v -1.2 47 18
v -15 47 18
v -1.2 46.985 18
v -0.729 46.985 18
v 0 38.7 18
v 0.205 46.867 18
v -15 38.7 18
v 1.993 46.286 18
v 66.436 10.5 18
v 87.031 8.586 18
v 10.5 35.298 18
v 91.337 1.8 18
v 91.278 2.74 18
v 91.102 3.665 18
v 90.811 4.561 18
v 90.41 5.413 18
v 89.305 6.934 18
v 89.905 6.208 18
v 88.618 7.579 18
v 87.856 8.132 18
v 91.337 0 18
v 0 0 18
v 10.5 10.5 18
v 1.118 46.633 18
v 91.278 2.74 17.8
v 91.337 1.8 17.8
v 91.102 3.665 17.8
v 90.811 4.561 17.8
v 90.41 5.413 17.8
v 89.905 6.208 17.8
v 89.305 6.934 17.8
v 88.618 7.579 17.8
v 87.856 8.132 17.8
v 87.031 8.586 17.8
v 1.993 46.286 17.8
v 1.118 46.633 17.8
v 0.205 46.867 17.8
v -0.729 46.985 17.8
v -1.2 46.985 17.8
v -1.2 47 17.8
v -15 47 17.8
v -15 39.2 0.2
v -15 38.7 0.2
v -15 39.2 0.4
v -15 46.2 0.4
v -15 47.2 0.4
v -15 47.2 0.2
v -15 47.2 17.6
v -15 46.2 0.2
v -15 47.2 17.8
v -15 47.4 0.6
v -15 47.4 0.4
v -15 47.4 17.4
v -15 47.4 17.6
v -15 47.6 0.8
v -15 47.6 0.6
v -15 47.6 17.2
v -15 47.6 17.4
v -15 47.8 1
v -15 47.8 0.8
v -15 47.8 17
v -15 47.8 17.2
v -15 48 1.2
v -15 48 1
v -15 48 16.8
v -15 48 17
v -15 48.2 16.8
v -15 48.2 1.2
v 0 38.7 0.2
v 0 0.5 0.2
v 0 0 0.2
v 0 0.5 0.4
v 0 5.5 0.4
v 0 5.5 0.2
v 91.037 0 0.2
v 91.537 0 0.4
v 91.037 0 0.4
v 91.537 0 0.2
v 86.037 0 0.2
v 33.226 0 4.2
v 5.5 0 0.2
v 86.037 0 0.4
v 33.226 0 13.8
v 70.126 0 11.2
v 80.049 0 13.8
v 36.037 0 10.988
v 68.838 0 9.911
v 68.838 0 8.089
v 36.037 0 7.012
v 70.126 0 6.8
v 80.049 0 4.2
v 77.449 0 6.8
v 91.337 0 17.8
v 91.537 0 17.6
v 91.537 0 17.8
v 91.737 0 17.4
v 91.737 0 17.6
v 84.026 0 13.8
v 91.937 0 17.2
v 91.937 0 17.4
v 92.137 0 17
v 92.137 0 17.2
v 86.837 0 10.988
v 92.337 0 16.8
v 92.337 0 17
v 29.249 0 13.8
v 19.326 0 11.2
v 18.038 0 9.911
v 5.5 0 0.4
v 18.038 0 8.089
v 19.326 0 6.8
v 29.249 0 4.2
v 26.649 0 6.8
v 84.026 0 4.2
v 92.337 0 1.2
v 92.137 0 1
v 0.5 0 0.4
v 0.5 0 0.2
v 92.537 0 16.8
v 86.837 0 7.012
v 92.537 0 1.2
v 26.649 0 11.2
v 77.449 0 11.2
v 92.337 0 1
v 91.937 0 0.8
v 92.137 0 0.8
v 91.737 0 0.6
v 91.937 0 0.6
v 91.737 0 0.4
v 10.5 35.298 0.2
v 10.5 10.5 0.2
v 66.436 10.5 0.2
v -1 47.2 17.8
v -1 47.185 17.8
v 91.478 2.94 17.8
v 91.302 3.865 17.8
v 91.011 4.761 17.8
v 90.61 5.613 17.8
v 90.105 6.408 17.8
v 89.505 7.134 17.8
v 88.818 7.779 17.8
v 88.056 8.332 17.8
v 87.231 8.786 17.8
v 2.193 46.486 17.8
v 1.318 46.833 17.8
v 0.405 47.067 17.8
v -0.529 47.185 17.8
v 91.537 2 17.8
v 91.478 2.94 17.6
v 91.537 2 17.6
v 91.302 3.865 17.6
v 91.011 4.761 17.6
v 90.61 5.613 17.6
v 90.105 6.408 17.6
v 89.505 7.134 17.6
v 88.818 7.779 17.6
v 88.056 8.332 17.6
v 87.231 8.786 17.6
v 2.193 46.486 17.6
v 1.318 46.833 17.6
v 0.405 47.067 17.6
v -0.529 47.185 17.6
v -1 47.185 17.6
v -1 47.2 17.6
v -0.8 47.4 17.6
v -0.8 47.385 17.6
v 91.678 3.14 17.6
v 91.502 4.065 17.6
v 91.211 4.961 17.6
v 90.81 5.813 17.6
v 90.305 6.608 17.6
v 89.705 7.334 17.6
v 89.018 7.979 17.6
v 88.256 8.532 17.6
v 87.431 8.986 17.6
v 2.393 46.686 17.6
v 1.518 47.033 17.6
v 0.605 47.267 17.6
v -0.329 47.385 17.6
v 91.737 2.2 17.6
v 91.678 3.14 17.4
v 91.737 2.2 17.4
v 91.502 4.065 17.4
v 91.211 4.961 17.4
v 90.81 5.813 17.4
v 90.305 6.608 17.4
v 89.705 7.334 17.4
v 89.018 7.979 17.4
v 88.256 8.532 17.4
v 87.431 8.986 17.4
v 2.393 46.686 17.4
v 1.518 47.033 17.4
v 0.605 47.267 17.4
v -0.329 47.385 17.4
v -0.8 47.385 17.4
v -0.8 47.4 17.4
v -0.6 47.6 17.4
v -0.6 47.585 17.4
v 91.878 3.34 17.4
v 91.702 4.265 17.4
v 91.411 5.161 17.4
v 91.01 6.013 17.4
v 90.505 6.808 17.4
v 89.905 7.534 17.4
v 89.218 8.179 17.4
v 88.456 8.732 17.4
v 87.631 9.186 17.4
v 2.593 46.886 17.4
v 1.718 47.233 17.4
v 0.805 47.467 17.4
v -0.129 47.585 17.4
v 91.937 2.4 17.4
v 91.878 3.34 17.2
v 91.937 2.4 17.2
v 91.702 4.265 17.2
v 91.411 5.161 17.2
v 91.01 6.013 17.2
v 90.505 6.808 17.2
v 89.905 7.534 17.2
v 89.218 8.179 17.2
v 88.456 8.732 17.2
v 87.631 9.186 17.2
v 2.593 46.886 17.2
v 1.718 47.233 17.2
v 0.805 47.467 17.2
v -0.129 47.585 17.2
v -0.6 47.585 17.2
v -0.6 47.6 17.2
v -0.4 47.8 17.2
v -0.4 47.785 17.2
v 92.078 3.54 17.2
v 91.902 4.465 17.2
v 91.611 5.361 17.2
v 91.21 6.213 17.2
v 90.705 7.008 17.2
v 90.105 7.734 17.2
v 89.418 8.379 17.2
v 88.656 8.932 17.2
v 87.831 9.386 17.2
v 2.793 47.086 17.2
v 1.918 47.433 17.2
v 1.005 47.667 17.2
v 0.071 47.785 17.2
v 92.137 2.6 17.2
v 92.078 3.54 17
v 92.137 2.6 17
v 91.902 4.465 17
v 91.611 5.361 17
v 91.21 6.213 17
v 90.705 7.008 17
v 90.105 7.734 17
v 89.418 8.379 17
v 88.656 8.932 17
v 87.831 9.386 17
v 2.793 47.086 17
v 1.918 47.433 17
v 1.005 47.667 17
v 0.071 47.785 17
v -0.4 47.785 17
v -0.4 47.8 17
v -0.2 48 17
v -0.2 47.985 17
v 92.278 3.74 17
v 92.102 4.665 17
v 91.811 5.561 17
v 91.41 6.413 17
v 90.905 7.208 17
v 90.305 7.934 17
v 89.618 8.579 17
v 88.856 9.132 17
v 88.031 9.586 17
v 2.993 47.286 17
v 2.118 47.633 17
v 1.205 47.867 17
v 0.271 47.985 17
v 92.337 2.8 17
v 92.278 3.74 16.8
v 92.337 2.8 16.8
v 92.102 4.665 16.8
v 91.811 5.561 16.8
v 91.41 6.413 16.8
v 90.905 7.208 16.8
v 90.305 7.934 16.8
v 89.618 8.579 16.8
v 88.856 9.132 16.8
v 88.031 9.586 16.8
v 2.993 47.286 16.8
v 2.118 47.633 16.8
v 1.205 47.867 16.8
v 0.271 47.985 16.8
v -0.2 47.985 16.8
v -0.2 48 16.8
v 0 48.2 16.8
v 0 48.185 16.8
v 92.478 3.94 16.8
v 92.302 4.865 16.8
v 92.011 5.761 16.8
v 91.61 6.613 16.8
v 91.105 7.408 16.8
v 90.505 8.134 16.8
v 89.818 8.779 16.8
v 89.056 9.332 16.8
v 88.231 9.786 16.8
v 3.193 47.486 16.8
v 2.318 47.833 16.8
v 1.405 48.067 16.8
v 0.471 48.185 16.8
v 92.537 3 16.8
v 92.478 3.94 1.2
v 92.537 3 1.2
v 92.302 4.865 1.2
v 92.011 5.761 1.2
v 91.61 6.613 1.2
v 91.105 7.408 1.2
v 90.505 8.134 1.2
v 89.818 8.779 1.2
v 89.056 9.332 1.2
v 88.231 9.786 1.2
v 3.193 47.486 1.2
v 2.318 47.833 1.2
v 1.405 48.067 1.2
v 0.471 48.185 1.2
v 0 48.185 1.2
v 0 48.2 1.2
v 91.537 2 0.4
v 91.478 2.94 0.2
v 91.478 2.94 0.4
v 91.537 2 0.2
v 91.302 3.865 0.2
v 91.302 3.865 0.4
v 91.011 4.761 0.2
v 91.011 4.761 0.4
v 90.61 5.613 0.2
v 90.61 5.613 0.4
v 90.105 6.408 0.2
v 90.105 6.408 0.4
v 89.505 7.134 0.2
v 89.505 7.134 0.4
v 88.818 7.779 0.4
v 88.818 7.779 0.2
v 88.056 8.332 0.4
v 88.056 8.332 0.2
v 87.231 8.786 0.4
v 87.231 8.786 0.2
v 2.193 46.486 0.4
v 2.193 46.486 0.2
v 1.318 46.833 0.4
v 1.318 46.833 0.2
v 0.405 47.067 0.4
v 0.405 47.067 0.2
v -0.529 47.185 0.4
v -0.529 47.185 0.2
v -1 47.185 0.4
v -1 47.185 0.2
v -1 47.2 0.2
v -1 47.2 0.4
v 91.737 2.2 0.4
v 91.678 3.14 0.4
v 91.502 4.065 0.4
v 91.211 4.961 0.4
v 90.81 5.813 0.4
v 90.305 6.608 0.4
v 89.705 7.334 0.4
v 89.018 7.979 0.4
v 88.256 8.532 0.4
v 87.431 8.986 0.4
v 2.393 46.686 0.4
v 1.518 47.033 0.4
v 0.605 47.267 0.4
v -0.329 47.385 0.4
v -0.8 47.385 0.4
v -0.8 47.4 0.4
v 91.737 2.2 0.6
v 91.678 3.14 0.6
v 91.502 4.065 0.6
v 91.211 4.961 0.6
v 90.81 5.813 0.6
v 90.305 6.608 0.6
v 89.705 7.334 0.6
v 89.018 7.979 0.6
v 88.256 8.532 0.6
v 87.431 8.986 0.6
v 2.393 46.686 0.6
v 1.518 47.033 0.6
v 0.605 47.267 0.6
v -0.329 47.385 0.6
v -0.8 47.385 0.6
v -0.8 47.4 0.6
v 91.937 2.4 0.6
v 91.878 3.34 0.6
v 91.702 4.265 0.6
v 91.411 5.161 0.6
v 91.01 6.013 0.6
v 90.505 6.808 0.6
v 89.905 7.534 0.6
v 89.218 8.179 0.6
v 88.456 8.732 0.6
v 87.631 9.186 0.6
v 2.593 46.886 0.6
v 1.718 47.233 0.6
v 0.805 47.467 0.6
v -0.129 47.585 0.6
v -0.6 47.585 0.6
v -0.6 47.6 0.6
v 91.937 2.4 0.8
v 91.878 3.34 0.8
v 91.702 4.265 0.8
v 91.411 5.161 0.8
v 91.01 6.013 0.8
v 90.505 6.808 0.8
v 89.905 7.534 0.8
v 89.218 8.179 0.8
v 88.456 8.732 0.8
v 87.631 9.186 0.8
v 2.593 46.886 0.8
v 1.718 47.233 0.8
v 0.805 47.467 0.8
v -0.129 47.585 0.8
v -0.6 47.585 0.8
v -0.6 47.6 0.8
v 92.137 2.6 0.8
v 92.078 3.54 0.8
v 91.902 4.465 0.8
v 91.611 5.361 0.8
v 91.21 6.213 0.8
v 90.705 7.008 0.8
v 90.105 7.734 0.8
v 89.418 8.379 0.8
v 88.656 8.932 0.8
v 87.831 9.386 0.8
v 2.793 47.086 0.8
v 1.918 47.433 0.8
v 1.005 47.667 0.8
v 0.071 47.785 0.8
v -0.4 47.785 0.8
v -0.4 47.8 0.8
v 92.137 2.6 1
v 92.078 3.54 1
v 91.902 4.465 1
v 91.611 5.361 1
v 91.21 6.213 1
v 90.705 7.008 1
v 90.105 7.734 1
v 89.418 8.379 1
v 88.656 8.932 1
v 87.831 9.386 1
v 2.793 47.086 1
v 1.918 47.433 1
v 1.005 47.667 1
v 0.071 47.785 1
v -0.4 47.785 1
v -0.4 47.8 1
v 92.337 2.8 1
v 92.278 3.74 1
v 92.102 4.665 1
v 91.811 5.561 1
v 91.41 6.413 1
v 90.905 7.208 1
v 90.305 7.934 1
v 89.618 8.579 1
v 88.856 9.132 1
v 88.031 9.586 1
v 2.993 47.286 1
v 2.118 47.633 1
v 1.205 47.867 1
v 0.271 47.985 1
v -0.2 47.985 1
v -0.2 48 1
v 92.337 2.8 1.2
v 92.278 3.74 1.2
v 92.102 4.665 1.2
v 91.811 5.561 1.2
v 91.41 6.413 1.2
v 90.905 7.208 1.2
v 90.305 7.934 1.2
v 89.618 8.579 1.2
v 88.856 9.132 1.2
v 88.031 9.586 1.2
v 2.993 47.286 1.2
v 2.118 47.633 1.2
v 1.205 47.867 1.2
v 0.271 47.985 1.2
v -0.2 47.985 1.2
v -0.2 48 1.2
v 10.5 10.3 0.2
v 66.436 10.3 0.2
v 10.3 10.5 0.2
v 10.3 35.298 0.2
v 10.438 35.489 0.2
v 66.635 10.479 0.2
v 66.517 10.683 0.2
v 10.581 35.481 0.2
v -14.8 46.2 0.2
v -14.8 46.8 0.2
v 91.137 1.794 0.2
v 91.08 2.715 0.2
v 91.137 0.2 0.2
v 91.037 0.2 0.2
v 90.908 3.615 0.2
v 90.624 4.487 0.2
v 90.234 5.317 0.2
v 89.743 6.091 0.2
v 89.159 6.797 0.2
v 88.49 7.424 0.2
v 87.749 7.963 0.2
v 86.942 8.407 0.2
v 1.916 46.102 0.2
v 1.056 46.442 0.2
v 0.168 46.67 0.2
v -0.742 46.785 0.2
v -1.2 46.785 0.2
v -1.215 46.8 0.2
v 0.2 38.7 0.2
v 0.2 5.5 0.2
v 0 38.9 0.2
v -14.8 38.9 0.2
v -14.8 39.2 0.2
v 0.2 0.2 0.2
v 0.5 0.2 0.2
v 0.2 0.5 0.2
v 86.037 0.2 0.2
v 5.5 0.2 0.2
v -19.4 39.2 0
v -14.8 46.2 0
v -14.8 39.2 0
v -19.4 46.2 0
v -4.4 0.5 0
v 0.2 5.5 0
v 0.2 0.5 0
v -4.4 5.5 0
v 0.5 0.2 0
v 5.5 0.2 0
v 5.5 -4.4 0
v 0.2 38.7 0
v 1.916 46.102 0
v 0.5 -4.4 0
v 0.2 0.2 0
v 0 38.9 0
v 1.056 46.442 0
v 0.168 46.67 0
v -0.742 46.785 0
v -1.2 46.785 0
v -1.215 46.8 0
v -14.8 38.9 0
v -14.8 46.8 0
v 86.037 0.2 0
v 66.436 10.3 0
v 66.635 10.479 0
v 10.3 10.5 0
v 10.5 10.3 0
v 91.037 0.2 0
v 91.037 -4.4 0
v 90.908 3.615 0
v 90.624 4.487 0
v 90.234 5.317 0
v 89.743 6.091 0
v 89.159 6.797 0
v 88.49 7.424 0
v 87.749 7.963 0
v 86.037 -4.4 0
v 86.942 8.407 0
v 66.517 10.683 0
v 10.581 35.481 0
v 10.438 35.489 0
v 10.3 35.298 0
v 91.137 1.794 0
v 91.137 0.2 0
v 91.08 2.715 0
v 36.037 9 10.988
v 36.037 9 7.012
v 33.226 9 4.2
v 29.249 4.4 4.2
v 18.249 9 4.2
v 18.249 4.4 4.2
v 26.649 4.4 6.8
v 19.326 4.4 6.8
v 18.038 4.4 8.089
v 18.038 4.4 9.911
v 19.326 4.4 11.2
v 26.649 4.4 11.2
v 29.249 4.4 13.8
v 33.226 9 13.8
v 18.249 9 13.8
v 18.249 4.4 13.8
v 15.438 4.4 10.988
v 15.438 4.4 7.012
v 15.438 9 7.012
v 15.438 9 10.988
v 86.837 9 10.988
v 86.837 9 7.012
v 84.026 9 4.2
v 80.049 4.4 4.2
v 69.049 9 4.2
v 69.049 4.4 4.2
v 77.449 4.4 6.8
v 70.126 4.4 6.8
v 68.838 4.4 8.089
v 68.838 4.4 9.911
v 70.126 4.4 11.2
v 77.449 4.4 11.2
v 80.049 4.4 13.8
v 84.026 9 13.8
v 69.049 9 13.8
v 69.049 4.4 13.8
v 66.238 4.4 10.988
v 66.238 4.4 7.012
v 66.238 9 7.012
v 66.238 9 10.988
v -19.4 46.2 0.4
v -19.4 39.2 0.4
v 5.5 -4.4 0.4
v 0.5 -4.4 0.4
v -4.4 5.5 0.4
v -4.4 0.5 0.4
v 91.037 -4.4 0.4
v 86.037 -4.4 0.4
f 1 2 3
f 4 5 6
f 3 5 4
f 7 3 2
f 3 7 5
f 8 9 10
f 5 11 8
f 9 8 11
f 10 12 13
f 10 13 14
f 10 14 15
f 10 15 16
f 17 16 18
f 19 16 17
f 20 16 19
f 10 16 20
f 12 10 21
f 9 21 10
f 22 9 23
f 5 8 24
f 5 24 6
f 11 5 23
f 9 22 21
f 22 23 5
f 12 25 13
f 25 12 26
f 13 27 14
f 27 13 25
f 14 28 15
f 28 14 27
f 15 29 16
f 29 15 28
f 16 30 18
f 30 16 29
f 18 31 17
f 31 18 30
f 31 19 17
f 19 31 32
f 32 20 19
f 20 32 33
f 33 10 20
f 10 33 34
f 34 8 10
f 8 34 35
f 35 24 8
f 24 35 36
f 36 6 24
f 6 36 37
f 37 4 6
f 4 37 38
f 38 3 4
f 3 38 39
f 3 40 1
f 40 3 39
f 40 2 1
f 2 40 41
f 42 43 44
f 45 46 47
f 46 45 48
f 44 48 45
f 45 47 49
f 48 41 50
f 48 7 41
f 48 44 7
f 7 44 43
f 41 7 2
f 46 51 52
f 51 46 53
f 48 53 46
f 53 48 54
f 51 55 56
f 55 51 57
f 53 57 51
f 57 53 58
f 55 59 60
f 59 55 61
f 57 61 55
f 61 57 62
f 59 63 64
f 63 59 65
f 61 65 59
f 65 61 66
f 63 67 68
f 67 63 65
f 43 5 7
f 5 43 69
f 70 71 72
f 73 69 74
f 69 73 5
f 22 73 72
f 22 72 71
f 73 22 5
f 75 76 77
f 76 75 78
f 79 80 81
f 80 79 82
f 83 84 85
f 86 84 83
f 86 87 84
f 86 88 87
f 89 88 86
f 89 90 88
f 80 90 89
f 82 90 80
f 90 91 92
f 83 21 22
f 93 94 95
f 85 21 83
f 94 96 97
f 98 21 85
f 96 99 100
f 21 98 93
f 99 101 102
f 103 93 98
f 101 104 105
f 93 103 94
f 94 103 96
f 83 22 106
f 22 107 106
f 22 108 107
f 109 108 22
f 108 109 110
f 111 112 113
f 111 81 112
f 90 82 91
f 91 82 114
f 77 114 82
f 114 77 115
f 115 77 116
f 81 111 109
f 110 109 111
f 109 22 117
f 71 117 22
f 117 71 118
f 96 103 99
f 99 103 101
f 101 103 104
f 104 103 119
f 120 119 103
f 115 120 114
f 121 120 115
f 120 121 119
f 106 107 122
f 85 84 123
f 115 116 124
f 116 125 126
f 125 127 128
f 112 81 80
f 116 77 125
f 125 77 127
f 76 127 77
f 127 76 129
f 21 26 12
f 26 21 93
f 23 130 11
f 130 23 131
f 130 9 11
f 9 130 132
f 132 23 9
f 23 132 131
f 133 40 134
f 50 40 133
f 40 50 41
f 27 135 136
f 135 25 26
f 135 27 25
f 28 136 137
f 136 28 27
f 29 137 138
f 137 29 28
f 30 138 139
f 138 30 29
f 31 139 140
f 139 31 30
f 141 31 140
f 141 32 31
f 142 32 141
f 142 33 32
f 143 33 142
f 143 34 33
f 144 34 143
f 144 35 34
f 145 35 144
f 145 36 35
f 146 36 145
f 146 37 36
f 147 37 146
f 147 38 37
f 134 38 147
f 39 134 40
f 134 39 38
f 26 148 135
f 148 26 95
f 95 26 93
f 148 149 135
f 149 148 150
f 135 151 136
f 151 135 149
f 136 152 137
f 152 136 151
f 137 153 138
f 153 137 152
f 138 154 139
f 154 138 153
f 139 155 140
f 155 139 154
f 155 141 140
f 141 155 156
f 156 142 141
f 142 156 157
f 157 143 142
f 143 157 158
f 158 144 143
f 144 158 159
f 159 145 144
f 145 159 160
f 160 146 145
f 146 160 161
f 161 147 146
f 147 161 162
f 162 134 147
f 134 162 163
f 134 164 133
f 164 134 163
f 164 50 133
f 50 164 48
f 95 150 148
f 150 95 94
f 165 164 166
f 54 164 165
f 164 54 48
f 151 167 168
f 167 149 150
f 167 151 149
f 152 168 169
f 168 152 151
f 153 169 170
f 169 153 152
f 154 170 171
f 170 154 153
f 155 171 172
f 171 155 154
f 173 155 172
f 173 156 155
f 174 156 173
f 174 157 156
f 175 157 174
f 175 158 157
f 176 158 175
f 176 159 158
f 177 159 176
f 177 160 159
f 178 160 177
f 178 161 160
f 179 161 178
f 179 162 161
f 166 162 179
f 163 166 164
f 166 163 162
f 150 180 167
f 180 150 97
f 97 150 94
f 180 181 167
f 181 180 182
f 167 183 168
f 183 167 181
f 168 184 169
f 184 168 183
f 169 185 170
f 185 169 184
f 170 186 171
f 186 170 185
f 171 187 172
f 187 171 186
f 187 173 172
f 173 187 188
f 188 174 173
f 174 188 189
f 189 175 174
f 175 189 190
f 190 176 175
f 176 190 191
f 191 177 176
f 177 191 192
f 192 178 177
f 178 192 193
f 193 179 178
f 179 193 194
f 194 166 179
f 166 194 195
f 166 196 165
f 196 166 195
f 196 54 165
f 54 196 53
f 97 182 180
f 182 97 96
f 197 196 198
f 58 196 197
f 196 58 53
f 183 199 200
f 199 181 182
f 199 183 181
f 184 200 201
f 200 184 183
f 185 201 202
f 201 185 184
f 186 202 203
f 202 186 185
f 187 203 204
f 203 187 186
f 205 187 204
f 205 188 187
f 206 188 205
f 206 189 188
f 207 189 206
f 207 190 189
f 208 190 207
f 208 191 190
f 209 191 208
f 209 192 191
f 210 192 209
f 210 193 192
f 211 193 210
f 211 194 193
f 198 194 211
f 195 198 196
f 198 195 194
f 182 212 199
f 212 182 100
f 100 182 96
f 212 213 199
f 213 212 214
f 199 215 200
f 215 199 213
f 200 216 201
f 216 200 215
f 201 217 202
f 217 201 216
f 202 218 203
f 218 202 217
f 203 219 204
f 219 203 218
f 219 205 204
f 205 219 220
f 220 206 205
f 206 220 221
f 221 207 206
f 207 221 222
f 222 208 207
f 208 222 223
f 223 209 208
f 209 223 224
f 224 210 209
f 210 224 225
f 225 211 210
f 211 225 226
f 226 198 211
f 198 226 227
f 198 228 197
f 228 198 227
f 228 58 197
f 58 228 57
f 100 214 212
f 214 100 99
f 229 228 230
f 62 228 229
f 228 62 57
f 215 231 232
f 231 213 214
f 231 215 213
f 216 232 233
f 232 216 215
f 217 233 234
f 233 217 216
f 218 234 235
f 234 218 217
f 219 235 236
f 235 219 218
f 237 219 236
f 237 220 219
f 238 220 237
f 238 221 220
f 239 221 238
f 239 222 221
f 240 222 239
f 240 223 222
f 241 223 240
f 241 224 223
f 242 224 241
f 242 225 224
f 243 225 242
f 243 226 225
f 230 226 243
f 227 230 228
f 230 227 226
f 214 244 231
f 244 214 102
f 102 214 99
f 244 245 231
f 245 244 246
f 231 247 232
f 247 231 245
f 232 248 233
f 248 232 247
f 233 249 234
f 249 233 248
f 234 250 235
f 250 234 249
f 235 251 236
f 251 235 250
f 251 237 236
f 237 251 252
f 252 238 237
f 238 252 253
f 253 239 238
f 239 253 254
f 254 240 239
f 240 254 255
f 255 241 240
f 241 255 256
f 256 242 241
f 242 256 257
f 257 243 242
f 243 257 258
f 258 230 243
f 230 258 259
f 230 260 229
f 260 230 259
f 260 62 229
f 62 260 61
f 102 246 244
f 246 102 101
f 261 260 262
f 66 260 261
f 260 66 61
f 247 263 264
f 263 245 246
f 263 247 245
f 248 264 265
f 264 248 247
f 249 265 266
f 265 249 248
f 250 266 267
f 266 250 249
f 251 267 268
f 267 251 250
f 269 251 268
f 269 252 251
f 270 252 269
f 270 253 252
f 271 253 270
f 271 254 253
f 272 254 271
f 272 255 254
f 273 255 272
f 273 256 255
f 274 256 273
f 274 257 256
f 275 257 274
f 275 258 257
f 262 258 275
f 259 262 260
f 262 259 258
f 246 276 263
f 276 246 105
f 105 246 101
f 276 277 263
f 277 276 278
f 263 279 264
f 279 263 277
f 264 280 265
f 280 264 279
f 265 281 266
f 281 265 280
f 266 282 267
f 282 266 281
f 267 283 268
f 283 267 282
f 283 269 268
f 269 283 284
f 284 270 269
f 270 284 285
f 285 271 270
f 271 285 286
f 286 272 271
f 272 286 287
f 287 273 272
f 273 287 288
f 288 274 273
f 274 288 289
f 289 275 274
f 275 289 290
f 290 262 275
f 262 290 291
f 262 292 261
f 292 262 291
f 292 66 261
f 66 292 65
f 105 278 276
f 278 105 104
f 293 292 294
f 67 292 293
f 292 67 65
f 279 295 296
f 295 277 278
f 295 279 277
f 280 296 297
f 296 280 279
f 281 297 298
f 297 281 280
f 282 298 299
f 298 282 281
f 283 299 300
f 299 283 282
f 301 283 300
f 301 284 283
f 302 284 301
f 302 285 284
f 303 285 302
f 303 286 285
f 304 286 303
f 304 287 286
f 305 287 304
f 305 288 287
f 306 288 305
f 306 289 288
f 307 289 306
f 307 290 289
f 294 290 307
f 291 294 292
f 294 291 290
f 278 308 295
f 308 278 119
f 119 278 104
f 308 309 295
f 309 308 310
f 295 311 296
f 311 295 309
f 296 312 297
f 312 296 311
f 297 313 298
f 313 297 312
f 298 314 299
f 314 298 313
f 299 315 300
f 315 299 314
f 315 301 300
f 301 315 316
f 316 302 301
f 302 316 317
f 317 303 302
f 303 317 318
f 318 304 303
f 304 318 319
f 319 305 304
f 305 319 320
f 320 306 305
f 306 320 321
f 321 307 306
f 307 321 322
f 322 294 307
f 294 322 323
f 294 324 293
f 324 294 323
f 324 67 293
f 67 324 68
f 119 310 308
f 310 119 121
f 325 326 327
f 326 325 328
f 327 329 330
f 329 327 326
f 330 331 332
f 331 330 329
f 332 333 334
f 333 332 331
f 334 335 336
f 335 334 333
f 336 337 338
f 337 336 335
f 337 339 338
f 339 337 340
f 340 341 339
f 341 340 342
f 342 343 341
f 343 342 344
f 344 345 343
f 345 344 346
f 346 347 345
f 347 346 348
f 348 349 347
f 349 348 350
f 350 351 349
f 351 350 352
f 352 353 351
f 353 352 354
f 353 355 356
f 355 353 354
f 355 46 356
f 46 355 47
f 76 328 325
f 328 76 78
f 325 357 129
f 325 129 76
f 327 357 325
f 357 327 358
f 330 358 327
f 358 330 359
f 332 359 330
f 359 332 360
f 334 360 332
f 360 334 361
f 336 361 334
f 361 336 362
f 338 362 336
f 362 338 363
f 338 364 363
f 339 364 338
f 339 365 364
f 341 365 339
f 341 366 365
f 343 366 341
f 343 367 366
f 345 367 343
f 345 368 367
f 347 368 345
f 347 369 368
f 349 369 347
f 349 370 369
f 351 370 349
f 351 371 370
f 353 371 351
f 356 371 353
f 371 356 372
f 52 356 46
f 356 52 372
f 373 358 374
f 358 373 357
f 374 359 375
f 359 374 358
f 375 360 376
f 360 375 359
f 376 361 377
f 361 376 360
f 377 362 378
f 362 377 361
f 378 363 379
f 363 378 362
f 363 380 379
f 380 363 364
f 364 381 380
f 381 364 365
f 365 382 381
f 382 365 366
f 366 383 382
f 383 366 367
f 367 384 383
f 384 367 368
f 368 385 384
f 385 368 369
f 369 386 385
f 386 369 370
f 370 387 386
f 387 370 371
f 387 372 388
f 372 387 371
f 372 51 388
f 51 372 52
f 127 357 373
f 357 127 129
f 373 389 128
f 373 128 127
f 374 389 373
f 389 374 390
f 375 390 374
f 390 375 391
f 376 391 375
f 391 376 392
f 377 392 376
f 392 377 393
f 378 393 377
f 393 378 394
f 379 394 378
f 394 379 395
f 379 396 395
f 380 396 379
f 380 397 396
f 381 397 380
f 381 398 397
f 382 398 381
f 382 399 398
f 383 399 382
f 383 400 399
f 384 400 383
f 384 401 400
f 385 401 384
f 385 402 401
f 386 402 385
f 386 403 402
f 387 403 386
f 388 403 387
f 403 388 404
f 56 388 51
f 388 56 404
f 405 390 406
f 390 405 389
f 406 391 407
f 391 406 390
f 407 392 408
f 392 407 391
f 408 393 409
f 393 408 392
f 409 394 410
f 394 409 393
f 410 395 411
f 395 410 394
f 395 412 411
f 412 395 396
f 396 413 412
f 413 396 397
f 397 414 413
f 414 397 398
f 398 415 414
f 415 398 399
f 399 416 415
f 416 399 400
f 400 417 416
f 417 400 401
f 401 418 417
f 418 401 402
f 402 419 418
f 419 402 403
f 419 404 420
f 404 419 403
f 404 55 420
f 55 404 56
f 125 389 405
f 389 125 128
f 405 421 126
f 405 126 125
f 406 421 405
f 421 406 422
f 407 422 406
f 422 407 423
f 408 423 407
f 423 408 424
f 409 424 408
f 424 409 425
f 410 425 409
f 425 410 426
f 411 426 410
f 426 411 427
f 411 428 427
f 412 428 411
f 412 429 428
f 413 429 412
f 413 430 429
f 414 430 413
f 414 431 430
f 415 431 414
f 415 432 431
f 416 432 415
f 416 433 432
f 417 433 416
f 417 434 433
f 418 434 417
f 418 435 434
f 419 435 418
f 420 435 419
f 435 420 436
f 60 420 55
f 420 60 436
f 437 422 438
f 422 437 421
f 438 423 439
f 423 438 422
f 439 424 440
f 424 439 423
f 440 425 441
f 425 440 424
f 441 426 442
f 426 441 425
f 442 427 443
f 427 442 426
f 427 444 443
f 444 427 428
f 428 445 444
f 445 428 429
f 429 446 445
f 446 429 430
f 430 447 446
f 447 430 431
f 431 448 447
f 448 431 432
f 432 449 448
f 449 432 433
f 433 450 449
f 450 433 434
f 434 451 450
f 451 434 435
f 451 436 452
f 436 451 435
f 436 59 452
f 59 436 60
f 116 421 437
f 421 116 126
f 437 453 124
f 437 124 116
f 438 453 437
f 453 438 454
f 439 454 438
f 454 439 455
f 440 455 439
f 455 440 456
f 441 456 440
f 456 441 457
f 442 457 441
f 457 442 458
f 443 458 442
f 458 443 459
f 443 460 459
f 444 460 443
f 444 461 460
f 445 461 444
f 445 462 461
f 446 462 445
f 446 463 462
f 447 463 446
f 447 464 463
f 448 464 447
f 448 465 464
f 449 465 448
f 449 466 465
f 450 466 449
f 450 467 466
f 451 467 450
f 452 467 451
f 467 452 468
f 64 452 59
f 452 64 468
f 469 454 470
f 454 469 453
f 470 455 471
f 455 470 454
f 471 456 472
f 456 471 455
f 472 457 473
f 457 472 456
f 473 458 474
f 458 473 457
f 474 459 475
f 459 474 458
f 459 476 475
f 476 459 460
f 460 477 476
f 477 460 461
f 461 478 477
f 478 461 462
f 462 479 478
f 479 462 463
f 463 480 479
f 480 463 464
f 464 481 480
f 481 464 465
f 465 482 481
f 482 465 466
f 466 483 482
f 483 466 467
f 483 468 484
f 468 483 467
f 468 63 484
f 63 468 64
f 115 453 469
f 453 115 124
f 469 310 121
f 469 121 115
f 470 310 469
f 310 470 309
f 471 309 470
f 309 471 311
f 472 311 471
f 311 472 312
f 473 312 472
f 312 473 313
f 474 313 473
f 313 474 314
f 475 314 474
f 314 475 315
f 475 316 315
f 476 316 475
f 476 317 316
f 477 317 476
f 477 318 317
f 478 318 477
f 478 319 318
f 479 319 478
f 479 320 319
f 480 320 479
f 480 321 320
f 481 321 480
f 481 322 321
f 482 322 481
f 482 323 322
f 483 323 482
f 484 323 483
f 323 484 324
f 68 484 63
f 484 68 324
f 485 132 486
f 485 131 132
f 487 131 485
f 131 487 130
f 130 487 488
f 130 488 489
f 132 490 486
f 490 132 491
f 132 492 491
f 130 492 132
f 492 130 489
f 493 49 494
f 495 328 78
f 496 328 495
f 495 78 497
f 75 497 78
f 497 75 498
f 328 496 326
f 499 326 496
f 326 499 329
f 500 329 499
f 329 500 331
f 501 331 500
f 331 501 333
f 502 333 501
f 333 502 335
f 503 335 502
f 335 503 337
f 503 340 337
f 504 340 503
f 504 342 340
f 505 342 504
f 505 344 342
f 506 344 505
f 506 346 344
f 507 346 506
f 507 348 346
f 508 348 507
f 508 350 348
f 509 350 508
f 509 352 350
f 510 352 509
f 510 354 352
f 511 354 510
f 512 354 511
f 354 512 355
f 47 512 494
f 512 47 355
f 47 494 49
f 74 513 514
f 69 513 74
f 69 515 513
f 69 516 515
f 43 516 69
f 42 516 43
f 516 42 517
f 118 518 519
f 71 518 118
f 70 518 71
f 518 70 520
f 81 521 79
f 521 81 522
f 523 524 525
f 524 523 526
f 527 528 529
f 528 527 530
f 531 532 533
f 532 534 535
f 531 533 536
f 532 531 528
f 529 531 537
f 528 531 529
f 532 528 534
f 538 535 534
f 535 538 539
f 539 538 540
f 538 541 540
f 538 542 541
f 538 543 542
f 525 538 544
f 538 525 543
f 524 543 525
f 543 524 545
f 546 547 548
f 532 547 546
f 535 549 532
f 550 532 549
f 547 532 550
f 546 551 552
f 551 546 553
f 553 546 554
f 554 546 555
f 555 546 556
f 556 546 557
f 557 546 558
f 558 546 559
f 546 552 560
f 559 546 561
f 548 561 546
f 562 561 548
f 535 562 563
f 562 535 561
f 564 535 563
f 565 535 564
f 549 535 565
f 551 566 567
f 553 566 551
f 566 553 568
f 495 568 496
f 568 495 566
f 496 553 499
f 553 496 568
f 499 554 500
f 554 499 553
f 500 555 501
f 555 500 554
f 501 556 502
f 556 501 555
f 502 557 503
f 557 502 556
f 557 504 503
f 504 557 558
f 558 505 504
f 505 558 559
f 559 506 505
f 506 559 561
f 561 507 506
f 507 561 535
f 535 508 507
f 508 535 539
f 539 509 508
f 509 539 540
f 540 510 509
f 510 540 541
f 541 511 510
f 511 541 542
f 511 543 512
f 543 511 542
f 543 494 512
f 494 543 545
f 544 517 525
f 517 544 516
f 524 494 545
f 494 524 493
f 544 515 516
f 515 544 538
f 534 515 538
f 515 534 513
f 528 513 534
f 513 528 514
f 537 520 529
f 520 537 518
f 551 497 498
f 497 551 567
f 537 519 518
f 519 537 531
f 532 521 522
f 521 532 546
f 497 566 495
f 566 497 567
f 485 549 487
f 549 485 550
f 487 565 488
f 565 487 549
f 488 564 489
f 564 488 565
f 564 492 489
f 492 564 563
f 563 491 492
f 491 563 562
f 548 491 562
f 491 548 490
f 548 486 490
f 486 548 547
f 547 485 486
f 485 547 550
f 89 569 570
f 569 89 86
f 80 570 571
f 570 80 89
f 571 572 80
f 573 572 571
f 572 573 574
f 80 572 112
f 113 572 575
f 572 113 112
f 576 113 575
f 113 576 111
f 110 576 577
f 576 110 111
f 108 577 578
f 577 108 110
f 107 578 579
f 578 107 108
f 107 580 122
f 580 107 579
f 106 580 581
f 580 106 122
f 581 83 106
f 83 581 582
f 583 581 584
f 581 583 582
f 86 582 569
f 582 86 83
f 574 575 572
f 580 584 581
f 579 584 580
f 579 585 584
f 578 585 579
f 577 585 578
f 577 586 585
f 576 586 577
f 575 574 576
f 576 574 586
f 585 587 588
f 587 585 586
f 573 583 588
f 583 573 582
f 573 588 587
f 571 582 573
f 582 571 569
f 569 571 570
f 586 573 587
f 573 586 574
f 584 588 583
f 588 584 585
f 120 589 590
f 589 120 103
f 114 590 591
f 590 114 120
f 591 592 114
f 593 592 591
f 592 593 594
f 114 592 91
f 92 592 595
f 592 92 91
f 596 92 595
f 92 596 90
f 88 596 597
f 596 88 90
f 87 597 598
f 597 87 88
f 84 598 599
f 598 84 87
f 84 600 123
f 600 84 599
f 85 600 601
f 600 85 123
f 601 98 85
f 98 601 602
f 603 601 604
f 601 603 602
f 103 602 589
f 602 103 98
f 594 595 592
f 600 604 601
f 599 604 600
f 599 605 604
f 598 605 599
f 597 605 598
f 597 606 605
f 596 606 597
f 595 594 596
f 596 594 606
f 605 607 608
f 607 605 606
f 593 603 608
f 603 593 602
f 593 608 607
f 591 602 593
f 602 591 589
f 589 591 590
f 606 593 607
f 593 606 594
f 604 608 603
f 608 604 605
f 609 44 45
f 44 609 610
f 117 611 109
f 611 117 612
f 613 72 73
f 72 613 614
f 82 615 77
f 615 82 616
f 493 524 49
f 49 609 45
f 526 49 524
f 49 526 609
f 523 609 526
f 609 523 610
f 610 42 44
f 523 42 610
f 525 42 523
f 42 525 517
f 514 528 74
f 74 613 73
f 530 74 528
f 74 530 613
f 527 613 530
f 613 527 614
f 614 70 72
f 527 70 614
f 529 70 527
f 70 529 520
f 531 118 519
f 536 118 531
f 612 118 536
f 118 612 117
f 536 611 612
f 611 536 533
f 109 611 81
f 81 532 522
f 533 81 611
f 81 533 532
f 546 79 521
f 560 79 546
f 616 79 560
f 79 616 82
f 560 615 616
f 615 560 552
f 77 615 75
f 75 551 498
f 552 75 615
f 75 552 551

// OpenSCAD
eps = 0.001;

// Table parameters.
//
// The folding table is 1.5" thick. Add 0.6mm of slack.
table_thickness = 1.5 * 25.4 + 0.6;
table_width = 29.125 * 25.4;

// Leaf parameters.
screw_spacing = 2 * 25.4;
leaf_screw_spacing = 30.75 * 25.4;

// Add 0.4mm of slack on either side.
screw_offset = (leaf_screw_spacing - table_width) / 2 - 0.4;

gauge = 9.5;
depth = 15;
width = 18;
chamfer = gauge - 2;

flat = screw_offset + screw_spacing + gauge + 12;

module chop_2d() {
  $fn = 40;
  difference() {
    square(1);
    circle(1);
  }
}


module exterior_2d() {  
  // Finger.
  translate([-depth, table_thickness])
    square([depth, gauge]);

  intersection() {
    square([gauge + flat, table_thickness + gauge]);
    
    hull() {
      $fn = 50;
      square(1);
      translate([0, table_thickness + gauge - chamfer])
        circle(chamfer);
      translate([flat - chamfer, gauge - chamfer + 1])
        circle(chamfer);
      translate([flat - chamfer, 0])
        square([chamfer, eps]);
    }
  }
}

module body_2d() {
  difference() {
    exterior_2d();
    translate([1, 1])
      offset(-gauge)
        exterior_2d();
  }
}

module body() {
  chamf_layers = 6;
  layer = 0.2;

  for (a = [-1, 1]) {
    scale([1, 1, a]) {
      translate([0, 0, -width/2]) {
        for (b = [0:chamf_layers-1]) { 
          translate([0, 0, b*layer]) {
            linear_extrude(layer + eps) {
              intersection() {
                body_2d();
                translate((b - chamf_layers)*[layer, layer])
                  exterior_2d();
              }
            }
          }
        }
        
        translate([0, 0, chamf_layers*layer])
          linear_extrude(width/2 - chamf_layers*layer + eps)
            body_2d();
      }
    }
  }
}

screw_shaft_diam = 4;
screw_shaft_length = 4.4;
screw_head_diam = 8.6;
screw_head_height = 4.6;

screw_cav_length = 11;

module octagon(d) {
  intersection() {
    square(d, center=true);
    rotate([0, 0, 45])
      square(d, center=true);
  }
}

module screw_cav() {
  $fn = 30;

  shaft = screw_shaft_diam + 0.4;
  head = screw_head_diam + 1;
  
  translate([0, 0, screw_shaft_length]) {
    translate([0, 0, -10]) {
      linear_extrude(10 + eps) {
        hull() {
          octagon(d=shaft);
          translate([screw_cav_length, 0]) octagon(d=shaft);
        }
        translate([screw_cav_length, 0]) octagon(d=head);
      }
    }

    linear_extrude(screw_head_height) {
      hull() {
        octagon(d=head);
        translate([screw_cav_length, 0]) octagon(d=head);
      }
    }
  }
}

module piercing_2d() {
  intersection() {
    difference() {
      $fn = 40;
      offset(-1.4)
        body_2d();
      offset(-2)
        body_2d();
    }
    union() {
      // Hook.
      translate([-depth, 0])
        square([depth + gauge*0.3, 1000]);
      
      // Screw holes.
      square([flat, gauge/2]);
    }
  }
}

module piece(reinf=true) {
  difference() {
    union() {
      // Foot.
      translate([0, 0, -width/2])
        linear_extrude(0.2)
          offset(-0.2)
            projection(cut=true)
              translate([0, 0, width/2-0.1])
                body();

      intersection() {
        body();
        translate([0, 0, 500.2-width/2])
          cube(1000, center=true);
      }
    }
      
    rotate([-90, 0, 0]) {
      translate([screw_offset, 0])
        screw_cav();
      translate([screw_offset + screw_spacing, 0])
        screw_cav();
    }
    
    if (reinf)
      for (z = width/5 * [-1.6, -0.75, 0.75, 1.6])
        translate([0, 0, z - 0.1])
          linear_extrude(0.2)
            piercing_2d();
  }
}

module print(reinf=true) {
  translate([0, 0, width/2])
    piece(reinf);
  
  // Tags.
  linear_extrude(0.4) {
    translate([-4.4, 0.5]) square(5);
    translate([0.5, -4.4]) square(5);
    translate([flat - 6.5, -4.4]) square(5);
    translate([-depth - 4.4, table_thickness + 0.5]) square([5, gauge-2.5]);
  }
}

print(false);
